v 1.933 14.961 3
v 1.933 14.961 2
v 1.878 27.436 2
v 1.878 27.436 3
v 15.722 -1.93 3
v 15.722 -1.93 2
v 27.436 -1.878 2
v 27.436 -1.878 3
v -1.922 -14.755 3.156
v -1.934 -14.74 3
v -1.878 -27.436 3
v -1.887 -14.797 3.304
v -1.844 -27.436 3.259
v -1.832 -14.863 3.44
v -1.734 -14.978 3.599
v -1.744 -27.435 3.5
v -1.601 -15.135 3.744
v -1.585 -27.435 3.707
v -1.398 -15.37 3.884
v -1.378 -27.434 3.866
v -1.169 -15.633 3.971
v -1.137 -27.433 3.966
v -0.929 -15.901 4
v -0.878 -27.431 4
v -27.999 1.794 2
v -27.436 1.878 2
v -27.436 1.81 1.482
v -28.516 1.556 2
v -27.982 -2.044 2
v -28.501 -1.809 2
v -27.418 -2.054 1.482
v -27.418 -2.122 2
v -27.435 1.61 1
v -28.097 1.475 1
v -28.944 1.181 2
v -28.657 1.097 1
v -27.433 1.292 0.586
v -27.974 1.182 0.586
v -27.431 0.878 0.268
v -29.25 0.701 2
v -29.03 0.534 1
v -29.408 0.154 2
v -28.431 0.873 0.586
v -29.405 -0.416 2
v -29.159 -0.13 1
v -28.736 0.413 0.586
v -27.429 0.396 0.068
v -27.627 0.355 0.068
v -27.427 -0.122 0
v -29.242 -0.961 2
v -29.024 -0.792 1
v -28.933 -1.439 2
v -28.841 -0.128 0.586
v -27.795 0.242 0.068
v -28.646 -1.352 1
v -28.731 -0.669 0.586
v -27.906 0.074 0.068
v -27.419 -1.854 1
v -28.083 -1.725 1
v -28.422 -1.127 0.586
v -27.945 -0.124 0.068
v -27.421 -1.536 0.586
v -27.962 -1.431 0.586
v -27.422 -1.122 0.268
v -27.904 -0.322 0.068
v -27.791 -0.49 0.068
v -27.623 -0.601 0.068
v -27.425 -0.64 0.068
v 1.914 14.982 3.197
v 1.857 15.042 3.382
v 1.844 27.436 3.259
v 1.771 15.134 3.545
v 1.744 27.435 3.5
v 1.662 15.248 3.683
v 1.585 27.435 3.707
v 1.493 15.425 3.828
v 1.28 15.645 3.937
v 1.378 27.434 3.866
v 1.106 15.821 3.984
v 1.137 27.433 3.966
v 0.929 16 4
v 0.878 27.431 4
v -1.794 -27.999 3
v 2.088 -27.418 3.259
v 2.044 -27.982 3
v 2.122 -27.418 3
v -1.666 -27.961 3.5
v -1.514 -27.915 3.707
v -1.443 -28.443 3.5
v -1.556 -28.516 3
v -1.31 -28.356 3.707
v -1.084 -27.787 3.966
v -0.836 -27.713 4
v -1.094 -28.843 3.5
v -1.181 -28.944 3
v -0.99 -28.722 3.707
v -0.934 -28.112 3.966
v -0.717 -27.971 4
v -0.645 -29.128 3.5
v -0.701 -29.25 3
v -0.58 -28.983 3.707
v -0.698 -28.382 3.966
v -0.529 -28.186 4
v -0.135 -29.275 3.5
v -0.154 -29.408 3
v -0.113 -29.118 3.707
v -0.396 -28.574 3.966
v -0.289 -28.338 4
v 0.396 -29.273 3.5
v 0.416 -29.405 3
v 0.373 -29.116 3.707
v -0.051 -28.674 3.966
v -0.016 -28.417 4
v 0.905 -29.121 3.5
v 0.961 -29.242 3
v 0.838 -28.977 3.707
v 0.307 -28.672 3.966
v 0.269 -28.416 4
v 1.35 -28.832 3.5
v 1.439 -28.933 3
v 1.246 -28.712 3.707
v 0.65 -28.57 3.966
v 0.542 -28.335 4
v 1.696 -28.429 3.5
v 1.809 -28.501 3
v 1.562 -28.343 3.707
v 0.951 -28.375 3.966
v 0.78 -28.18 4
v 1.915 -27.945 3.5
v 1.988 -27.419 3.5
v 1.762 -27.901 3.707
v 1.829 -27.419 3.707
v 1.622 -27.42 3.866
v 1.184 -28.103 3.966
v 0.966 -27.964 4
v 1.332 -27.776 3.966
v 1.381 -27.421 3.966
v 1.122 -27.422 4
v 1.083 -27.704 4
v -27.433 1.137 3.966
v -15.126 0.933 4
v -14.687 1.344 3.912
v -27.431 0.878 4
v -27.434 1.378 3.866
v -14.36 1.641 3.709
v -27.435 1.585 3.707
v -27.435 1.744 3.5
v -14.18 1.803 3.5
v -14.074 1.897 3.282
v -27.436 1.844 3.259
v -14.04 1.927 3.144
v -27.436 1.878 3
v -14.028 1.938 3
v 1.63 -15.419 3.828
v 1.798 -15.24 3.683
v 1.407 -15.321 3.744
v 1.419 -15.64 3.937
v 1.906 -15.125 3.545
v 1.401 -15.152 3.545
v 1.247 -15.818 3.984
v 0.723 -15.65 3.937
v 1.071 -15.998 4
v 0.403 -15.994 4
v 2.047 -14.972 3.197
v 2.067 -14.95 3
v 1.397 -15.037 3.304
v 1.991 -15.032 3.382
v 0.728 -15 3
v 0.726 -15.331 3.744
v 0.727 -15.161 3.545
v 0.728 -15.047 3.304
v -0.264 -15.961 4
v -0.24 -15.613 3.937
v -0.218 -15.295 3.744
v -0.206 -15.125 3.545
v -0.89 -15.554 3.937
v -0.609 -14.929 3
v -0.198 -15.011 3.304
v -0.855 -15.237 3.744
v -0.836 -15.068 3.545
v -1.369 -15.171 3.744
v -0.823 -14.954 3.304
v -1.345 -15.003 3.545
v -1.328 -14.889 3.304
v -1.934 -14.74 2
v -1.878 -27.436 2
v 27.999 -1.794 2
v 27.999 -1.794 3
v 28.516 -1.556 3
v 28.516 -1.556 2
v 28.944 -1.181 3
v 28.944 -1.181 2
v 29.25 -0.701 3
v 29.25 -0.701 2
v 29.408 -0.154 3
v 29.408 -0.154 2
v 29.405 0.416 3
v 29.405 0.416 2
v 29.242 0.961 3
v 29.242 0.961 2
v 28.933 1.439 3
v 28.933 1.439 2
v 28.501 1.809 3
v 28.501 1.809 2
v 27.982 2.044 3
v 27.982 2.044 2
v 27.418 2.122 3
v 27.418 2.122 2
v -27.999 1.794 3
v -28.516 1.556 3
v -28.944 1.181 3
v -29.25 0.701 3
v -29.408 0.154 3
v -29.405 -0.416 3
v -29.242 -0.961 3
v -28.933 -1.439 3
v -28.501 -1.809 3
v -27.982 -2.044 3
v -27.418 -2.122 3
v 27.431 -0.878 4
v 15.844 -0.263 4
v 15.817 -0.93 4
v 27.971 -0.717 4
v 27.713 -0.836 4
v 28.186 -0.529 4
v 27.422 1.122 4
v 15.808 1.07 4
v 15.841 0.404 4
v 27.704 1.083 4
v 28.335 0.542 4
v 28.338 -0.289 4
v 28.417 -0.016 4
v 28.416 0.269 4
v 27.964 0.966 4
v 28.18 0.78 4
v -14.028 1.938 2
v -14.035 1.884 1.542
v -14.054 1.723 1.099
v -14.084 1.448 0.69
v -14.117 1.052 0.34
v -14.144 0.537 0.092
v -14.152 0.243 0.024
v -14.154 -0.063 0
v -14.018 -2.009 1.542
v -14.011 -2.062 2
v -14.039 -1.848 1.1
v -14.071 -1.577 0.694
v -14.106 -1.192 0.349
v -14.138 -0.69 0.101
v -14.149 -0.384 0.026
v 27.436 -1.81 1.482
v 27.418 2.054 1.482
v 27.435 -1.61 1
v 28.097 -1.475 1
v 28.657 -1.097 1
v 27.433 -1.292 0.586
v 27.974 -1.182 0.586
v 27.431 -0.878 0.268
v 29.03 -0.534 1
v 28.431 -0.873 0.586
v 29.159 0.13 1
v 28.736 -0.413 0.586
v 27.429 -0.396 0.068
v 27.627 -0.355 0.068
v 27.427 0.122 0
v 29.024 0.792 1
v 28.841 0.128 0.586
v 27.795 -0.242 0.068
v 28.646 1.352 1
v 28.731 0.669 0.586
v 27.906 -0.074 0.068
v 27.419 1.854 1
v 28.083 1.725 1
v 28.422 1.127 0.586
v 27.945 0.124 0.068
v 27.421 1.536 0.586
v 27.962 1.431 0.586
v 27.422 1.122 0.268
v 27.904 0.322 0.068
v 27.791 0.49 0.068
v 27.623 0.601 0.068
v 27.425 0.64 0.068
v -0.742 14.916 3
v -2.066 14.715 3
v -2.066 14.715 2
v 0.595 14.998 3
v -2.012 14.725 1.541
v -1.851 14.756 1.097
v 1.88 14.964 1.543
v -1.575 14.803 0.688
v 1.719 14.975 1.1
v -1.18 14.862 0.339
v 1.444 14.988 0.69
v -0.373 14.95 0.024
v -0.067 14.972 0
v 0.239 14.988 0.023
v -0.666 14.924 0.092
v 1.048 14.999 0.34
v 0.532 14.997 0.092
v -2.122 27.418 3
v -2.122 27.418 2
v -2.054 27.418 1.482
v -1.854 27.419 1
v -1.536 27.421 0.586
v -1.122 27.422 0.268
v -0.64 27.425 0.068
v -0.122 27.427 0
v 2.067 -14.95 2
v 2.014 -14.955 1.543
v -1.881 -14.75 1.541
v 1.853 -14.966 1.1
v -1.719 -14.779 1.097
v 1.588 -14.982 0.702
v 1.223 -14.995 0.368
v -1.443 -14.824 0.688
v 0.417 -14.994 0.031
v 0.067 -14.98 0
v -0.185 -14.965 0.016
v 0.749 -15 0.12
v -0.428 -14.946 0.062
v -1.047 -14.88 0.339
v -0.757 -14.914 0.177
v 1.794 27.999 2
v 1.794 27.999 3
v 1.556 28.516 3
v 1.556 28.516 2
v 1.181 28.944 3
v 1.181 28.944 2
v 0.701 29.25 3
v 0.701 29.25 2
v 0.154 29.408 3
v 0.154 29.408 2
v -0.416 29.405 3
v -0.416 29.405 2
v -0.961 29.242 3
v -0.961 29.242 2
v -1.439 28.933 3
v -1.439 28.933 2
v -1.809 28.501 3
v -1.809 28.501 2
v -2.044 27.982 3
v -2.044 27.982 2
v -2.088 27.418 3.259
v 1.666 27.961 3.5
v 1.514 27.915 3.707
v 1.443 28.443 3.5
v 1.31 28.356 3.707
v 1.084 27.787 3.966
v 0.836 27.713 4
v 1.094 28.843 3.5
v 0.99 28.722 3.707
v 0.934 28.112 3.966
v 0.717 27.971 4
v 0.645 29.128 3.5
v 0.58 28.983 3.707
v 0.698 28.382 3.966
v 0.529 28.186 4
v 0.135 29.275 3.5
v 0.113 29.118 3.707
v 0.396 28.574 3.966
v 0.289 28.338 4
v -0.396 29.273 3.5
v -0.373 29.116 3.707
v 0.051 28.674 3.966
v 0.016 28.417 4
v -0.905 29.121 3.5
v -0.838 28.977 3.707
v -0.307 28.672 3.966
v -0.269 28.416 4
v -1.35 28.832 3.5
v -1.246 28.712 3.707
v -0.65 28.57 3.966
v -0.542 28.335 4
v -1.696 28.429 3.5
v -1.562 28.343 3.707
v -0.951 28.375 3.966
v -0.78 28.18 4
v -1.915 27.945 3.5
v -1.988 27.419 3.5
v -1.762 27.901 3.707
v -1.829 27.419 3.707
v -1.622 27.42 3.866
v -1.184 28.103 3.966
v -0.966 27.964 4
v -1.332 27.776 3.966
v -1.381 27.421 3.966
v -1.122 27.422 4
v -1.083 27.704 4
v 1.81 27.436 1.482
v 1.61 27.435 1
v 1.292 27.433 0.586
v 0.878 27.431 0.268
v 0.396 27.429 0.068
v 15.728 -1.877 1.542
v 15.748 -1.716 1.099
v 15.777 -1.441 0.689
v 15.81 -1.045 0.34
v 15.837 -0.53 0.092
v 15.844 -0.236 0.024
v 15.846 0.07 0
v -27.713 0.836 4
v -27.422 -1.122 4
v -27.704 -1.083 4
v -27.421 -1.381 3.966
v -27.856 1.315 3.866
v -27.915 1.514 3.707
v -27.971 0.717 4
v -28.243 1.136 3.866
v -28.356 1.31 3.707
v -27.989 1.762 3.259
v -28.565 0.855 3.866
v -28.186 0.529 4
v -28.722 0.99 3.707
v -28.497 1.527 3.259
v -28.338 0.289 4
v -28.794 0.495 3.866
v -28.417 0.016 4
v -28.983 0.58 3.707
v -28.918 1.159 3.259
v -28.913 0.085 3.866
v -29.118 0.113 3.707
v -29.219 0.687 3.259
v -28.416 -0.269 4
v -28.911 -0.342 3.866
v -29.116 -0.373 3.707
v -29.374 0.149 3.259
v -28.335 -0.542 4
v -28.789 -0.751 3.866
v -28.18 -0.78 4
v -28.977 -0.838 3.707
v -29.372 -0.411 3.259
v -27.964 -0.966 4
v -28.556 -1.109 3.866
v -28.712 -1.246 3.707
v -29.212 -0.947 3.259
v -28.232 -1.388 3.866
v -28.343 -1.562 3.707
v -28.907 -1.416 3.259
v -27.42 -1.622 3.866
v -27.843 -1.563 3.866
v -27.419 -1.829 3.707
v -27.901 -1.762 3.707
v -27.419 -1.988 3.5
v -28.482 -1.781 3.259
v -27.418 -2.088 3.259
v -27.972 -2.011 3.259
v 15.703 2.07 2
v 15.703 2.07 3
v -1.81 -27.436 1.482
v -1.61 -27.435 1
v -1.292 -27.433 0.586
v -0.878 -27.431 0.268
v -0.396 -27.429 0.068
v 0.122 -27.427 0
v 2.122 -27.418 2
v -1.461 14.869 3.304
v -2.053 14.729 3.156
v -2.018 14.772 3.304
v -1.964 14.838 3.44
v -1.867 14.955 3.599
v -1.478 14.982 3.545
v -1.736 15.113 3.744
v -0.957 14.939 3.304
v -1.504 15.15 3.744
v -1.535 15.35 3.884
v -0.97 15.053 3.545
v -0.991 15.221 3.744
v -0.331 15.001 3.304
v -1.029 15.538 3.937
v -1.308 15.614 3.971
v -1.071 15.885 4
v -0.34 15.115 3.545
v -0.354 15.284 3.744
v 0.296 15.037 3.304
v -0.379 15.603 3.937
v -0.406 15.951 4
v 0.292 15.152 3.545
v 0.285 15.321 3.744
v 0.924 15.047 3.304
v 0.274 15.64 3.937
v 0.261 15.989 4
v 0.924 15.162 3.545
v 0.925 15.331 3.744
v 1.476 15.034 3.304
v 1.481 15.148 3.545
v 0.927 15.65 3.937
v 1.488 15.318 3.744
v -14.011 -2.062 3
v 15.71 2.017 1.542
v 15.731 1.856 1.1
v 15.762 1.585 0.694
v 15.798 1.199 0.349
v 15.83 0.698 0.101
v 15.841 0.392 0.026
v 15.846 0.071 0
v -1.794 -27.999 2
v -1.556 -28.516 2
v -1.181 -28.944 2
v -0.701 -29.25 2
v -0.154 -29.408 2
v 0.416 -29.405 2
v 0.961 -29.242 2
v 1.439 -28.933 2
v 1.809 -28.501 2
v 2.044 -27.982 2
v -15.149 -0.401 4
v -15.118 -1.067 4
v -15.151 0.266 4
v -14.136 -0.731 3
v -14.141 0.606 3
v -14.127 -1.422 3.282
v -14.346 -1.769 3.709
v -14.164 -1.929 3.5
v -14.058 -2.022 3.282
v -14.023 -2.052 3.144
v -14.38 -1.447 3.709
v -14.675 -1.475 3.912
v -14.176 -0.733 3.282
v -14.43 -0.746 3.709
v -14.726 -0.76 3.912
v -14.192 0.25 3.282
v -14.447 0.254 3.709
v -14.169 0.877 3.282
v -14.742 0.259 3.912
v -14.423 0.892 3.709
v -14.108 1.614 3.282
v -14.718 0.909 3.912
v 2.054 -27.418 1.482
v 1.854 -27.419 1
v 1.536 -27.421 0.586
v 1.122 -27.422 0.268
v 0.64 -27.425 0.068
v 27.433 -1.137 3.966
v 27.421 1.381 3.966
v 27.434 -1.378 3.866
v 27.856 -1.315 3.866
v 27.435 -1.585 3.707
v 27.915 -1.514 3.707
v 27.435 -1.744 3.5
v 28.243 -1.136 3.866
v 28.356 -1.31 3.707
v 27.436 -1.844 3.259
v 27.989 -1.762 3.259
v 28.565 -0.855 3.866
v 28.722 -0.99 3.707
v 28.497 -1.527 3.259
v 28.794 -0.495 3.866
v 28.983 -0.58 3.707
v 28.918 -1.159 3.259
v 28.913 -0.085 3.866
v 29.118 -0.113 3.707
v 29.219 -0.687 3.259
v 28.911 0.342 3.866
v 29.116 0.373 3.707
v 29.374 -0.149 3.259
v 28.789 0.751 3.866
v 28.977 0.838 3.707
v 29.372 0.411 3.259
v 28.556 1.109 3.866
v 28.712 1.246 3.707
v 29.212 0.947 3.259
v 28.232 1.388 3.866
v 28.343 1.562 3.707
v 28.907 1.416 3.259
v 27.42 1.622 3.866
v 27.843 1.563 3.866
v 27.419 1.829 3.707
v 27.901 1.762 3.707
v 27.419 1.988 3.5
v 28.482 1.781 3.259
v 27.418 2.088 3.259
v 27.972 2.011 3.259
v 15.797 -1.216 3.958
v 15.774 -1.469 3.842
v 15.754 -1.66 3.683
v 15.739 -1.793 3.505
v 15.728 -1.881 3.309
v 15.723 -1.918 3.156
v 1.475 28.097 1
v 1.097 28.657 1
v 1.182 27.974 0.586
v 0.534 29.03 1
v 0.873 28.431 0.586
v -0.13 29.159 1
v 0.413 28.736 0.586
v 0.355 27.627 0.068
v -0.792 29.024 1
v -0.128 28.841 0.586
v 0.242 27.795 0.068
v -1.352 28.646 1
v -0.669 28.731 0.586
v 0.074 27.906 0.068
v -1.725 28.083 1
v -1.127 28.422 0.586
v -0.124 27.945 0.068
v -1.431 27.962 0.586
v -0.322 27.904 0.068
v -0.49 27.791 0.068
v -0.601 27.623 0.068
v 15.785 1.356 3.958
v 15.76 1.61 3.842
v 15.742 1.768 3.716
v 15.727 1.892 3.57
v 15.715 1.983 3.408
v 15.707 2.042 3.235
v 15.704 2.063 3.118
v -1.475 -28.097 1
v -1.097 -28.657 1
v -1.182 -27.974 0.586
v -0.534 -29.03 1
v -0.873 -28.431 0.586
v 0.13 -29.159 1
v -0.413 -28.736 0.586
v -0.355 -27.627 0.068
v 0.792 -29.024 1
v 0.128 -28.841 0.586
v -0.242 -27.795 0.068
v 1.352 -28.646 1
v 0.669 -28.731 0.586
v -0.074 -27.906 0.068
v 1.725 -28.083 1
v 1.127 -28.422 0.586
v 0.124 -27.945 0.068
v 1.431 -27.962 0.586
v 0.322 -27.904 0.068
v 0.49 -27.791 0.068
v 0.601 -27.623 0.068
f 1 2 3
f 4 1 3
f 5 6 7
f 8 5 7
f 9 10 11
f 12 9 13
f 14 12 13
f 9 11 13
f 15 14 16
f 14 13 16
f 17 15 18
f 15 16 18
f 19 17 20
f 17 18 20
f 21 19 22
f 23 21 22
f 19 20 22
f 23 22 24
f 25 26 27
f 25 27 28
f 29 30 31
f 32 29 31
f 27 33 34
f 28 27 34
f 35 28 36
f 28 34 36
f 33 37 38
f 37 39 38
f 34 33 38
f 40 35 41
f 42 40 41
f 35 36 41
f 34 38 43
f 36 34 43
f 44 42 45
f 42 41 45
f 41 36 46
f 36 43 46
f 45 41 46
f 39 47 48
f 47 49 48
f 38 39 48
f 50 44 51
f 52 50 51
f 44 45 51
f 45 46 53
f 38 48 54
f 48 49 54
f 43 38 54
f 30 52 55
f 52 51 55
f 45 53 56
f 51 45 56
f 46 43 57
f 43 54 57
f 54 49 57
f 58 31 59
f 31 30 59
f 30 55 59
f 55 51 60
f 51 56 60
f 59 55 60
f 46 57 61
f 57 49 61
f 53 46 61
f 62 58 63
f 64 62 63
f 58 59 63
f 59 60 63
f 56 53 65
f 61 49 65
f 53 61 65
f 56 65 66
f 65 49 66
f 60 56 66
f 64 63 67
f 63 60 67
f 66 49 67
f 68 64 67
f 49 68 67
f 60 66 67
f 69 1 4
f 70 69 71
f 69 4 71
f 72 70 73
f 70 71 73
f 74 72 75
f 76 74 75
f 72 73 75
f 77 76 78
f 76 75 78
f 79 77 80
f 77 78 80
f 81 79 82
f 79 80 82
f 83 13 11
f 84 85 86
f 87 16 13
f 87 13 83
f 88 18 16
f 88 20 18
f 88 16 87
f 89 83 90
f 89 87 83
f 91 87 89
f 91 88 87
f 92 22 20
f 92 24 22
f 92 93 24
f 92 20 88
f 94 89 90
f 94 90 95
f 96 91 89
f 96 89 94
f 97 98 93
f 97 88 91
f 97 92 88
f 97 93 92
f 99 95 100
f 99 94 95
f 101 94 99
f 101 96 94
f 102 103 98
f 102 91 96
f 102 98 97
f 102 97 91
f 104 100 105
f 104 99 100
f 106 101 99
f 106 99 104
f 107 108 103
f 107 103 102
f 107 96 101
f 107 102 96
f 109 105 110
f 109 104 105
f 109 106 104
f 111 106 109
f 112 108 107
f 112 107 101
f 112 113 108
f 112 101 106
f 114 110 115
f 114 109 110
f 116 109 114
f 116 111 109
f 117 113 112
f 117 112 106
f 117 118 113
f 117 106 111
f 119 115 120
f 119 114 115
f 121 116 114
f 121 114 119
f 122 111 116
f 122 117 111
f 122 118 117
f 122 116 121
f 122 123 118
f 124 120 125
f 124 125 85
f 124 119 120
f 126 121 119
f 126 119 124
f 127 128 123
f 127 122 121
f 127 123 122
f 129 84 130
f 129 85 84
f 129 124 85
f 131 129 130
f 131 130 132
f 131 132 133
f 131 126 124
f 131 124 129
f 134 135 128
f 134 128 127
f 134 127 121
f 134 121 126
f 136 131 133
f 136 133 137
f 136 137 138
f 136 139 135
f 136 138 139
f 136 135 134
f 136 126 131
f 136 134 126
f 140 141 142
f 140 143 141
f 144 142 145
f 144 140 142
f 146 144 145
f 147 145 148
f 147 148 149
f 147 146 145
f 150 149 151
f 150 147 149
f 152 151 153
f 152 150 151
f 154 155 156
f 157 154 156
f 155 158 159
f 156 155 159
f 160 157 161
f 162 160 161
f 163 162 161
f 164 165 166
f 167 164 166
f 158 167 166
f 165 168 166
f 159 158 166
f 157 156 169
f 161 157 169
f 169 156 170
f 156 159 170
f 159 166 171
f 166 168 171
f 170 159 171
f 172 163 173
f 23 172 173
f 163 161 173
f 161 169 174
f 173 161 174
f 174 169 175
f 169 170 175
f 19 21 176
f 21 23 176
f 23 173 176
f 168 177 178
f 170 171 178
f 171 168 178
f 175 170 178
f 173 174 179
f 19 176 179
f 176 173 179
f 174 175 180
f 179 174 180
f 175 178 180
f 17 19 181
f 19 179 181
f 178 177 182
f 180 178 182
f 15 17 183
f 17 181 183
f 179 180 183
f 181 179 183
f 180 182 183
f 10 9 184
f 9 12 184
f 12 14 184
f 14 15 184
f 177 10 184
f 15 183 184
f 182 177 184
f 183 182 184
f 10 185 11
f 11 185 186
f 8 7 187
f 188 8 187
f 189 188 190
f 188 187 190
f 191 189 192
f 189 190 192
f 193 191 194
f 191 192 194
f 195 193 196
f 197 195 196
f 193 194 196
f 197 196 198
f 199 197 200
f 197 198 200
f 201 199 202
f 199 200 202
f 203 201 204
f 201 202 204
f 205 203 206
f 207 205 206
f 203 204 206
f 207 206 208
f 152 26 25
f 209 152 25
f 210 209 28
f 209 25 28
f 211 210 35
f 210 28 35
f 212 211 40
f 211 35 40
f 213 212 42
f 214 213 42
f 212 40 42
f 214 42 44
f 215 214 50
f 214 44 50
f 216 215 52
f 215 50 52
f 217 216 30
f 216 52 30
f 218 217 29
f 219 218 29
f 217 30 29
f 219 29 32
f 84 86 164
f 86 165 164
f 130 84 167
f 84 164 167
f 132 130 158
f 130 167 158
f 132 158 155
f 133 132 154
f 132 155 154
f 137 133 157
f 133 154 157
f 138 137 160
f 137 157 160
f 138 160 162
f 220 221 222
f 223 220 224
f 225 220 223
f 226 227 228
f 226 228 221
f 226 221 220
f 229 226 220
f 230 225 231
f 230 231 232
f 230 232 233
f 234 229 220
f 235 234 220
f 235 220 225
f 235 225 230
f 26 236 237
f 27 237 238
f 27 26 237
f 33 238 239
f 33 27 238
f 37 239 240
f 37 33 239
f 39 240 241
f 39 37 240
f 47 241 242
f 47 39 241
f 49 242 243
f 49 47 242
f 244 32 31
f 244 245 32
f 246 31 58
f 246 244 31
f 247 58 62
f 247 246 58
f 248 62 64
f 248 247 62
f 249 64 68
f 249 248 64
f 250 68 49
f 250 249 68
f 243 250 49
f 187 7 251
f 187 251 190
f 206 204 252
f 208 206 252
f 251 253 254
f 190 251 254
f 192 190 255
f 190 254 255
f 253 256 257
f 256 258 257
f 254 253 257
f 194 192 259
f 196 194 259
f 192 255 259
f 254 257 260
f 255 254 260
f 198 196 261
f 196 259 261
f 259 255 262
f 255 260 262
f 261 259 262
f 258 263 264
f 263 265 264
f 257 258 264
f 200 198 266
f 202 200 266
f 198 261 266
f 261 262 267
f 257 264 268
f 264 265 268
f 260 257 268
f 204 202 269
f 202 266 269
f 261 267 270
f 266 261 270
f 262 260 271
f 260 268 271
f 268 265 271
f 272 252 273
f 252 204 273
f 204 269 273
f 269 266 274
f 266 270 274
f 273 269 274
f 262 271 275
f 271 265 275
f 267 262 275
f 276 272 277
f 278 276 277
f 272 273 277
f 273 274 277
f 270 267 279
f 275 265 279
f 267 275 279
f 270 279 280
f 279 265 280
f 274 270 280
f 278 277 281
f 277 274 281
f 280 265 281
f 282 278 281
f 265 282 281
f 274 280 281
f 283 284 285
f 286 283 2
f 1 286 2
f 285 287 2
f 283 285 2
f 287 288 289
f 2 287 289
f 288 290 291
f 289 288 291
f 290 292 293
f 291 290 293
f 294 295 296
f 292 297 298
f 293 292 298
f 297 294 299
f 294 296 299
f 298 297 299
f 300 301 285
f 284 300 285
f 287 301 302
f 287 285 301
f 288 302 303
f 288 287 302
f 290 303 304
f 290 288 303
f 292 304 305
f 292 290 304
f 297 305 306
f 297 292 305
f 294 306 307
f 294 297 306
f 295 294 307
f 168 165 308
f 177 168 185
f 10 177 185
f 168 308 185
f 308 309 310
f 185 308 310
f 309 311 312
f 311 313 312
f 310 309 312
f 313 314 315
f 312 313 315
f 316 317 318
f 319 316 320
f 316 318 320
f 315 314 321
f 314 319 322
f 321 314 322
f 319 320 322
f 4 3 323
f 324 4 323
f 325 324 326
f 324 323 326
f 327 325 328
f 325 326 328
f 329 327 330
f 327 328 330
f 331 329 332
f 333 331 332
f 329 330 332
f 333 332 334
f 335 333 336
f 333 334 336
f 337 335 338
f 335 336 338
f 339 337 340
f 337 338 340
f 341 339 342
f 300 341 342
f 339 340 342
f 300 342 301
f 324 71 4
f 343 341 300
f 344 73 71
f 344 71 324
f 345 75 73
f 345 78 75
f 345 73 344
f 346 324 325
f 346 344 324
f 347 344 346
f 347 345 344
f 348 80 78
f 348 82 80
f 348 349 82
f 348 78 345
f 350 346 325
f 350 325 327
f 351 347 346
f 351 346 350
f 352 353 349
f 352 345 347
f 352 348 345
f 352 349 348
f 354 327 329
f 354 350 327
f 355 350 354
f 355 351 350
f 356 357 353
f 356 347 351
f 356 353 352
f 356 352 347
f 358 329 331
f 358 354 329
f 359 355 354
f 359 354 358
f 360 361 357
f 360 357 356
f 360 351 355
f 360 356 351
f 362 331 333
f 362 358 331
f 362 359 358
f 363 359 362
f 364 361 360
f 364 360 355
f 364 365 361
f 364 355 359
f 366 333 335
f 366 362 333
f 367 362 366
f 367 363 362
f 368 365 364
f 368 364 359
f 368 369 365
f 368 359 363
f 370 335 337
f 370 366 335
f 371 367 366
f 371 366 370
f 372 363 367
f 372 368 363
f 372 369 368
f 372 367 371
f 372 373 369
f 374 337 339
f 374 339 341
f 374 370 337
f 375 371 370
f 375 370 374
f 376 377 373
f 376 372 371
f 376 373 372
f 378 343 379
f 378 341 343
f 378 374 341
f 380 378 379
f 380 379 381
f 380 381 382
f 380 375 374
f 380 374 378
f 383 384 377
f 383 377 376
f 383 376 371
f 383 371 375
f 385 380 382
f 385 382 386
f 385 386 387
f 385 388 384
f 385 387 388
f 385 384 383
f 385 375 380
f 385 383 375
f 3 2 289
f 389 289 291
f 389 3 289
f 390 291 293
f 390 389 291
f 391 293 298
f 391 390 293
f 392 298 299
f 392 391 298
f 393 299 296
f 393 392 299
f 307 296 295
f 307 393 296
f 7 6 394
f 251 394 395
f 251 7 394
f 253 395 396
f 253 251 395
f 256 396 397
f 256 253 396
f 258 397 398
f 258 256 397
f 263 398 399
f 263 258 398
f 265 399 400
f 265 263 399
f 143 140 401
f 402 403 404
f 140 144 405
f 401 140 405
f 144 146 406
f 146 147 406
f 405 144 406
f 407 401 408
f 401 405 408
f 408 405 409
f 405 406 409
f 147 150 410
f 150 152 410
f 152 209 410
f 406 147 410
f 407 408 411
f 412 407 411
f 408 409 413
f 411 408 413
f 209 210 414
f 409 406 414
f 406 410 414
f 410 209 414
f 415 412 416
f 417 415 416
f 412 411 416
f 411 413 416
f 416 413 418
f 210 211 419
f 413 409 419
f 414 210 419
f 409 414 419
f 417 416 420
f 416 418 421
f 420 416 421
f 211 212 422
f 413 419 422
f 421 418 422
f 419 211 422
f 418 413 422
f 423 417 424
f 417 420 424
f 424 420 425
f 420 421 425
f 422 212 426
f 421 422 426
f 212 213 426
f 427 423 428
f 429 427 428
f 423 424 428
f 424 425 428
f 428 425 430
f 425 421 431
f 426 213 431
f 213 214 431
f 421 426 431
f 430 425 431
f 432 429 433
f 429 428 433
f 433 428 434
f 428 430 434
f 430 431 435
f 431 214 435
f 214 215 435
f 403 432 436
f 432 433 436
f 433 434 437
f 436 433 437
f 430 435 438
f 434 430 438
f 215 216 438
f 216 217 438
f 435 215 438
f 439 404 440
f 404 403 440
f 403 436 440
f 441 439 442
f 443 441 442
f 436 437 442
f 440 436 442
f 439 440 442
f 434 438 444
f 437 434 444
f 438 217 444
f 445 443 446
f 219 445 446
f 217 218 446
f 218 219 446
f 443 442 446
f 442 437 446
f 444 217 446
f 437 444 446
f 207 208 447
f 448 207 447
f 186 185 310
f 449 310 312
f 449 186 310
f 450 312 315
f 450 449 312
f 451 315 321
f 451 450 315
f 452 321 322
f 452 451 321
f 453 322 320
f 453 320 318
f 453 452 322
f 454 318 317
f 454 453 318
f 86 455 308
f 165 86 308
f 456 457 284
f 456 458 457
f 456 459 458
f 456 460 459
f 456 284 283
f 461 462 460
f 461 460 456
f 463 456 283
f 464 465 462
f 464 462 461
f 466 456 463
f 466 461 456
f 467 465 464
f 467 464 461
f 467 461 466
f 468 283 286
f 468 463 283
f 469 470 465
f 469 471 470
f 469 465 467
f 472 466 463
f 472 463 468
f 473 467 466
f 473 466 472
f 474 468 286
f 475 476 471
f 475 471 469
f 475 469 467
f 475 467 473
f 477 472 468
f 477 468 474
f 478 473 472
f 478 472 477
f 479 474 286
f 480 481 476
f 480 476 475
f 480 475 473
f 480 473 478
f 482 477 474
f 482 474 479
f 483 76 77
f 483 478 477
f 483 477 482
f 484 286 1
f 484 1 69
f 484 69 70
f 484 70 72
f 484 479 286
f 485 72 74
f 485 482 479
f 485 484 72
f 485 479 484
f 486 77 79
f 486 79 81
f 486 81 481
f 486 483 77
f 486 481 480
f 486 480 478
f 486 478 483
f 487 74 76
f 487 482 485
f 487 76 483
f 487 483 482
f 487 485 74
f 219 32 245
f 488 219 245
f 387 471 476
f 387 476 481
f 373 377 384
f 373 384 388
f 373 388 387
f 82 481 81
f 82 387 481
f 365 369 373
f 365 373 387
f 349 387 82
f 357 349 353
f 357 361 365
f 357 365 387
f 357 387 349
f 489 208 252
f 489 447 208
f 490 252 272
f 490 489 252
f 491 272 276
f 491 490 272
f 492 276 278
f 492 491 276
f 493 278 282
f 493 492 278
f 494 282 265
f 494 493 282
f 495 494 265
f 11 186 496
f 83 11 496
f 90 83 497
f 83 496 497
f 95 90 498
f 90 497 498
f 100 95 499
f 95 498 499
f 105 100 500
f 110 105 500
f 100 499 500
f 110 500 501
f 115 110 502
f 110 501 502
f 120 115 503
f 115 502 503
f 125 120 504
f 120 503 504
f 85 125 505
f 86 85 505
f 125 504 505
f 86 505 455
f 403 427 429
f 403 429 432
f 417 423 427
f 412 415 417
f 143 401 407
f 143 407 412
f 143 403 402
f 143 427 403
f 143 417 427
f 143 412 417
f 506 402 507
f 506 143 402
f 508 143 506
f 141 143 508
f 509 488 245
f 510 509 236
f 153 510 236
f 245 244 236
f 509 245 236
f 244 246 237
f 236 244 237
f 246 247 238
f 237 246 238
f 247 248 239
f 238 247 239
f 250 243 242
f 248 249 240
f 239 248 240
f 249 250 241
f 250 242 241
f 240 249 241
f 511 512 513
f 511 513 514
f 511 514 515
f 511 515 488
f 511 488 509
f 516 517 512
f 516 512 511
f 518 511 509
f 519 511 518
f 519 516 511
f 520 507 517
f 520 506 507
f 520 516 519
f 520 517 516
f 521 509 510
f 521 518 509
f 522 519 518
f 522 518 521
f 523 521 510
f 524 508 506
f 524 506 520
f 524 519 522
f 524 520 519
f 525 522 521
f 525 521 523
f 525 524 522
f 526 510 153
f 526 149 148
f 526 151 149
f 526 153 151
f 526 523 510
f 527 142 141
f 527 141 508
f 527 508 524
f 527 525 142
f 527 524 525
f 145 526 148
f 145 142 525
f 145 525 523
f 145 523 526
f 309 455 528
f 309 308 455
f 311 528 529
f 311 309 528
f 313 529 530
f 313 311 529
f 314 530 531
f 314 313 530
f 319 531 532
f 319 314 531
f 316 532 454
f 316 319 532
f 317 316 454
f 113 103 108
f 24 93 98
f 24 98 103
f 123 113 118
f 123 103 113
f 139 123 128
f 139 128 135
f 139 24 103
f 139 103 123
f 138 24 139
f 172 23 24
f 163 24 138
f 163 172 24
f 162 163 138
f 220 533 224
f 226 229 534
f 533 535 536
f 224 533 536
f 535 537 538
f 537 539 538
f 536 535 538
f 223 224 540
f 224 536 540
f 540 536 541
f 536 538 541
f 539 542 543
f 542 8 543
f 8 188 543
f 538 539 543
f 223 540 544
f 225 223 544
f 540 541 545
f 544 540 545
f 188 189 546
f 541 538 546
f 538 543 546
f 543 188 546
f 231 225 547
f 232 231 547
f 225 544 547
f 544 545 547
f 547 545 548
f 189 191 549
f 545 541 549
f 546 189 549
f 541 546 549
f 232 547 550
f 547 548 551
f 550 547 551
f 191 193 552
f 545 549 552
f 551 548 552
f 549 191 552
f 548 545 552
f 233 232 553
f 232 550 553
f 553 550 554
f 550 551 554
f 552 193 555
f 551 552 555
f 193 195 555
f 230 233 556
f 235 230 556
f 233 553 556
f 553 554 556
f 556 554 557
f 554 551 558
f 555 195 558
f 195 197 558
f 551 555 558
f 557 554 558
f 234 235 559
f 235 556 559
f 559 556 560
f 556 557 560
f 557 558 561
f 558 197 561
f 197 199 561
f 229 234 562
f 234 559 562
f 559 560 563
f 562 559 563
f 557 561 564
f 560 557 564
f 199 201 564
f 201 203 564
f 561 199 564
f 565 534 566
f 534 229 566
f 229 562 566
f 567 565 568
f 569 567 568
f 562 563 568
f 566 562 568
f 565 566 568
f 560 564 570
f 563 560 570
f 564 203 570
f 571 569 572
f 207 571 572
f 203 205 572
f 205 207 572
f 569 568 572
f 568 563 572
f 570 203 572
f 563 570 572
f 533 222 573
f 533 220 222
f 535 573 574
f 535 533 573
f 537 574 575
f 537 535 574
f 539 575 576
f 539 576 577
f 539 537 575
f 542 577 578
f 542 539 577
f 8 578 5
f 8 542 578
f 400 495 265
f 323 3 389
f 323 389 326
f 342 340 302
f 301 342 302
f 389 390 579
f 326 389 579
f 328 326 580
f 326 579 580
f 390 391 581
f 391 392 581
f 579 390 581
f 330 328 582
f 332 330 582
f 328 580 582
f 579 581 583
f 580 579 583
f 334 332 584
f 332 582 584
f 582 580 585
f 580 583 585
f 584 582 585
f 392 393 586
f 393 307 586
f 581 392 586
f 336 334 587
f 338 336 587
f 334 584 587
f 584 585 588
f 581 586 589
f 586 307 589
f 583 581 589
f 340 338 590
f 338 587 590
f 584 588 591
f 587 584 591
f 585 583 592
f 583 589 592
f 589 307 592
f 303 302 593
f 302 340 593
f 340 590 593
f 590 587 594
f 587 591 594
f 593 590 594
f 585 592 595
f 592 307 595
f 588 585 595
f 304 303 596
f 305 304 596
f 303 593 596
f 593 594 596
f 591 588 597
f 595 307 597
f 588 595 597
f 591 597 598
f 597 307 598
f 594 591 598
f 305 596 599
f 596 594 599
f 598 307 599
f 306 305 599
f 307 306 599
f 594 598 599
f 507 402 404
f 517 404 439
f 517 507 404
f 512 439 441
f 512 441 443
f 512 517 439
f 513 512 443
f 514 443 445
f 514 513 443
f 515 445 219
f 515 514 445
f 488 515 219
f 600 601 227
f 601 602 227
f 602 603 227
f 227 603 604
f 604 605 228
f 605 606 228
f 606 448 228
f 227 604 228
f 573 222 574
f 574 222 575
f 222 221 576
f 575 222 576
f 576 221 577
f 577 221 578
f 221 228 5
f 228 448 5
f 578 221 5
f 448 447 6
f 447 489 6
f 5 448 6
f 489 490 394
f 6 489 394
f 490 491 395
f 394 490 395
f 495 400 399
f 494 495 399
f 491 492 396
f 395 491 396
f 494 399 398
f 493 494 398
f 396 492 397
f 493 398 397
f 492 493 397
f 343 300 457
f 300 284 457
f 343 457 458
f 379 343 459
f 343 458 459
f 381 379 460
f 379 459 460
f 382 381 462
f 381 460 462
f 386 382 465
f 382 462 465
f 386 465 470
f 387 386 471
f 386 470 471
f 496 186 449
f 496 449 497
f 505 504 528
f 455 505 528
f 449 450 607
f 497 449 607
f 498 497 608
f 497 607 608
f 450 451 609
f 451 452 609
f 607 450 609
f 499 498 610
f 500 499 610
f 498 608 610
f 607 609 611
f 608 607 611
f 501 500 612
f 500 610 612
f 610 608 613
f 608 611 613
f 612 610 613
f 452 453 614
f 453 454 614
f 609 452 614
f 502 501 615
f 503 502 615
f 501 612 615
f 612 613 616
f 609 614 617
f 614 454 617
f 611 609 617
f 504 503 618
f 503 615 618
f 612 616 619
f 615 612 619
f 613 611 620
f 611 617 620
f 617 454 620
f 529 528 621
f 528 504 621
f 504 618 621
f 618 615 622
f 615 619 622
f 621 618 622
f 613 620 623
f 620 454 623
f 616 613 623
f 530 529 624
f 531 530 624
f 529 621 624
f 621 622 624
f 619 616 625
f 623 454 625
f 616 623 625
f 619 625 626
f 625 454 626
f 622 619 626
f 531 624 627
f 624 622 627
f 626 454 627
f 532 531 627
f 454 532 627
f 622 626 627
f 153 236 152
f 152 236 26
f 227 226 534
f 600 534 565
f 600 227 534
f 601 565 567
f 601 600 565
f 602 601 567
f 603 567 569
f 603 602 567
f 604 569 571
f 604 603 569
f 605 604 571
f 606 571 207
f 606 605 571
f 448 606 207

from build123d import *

# Parameters (mm, degrees)
F1_DEPTH = 4
F2_R     = 1.9999
F2_2_R   = 1.9999
F2_3_R   = 1.9999
F2_4_R   = 1.9999
F3_R     = 1
F3_2_R   = 1
F3_3_R   = 1
F3_4_R   = 1


# Not quite as in the source:
# - a fillet or chamfer is up to 0.001 mm smaller than in the source, because OpenCascade refuses the exact size


with BuildPart() as f1:
    # F0 (on Top) → F1 (new body)
    with BuildSketch(Plane.XY):
        with BuildLine():
            ThreePointArc((-2.065538543, 14.7146584401), (-0.0743129661, 14.9717221589), (1.9334062251, 14.960555095))
            Line((1.9334062251, 14.960555095), (1.8778587128, 27.4358095681))
            ThreePointArc((1.8778587128, 27.4358095681), (-0.1310266046, 29.4268845997), (-2.1221016363, 27.4179992823))
            Line((-2.1221016363, 27.4179992823), (-2.065538543, 14.7146584401))
        make_face()
    extrude(amount=F1_DEPTH)

    # F2#3 (radius 2 in the source; OpenCascade refuses exactly that, so slightly less here)
    f2_3_edges = [f1.edges().sort_by_distance(p)[0] for p in [
        (1.905632, 21.198182, 0),
    ]]
    fillet(f2_3_edges, radius=F2_3_R)

    # F3#3
    f3_3_edges = [f1.edges().sort_by_distance(p)[0] for p in [
        (-2.09382, 21.066329, 4),
        (-0.074313, 14.971722, 4),
        (1.905632, 21.198182, 4),
        (-0.131027, 29.426885, 4),
    ]]
    fillet(f3_3_edges, radius=F3_3_R)


with BuildPart() as f1b:
    # F0 (on Top) → F1, piece 2 (new body)
    with BuildSketch(Plane.XY):
        with BuildLine():
            ThreePointArc((15.7027960238, 2.0699383398), (15.8461378969, 0.0705907094), (15.7216202135, -1.9300174947))
            Line((15.7216202135, -1.9300174947), (27.4358095681, -1.8778587128))
            ThreePointArc((27.4358095681, -1.8778587128), (29.4268845997, 0.1310266046), (27.4179992823, 2.1221016363))
            Line((27.4179992823, 2.1221016363), (15.7027960238, 2.0699383398))
        make_face()
    extrude(amount=F1_DEPTH)

    # F2#2 (radius 2 in the source; OpenCascade refuses exactly that, so slightly less here)
    f2_2_edges = [f1b.edges().sort_by_distance(p)[0] for p in [
        (21.578715, -1.903938, 0),
    ]]
    fillet(f2_2_edges, radius=F2_2_R)

    # F3#2
    f3_2_edges = [f1b.edges().sort_by_distance(p)[0] for p in [
        (21.578715, -1.903938, 4),
    ]]
    fillet(f3_2_edges, radius=F3_2_R)


with BuildPart() as f1c:
    # F0 (on Top) → F1, piece 3 (new body)
    with BuildSketch(Plane.XY):
        with BuildLine():
            Line((-14.0280318673, 1.9375583925), (-27.4358095681, 1.8778587127))
            ThreePointArc((-27.4358095681, 1.8778587128), (-29.4268845997, -0.1310266046), (-27.4179992823, -2.1221016363))
            Line((-27.4179992823, -2.1221016363), (-14.0112354856, -2.062406471))
            ThreePointArc((-14.0112354856, -2.062406471), (-14.153563757, -0.0629864294), (-14.0280318673, 1.9375583925))
        make_face()
    extrude(amount=F1_DEPTH)

    # F2#4 (radius 2 in the source; OpenCascade refuses exactly that, so slightly less here)
    f2_4_edges = [f1c.edges().sort_by_distance(p)[0] for p in [
        (-20.714617, -2.092254, 0),
    ]]
    fillet(f2_4_edges, radius=F2_4_R)

    # F3#4
    f3_4_edges = [f1c.edges().sort_by_distance(p)[0] for p in [
        (-20.714617, -2.092254, 4),
        (-14.153564, -0.062986, 4),
        (-20.731921, 1.907709, 4),
        (-29.426885, -0.131027, 4),
    ]]
    fillet(f3_4_edges, radius=F3_4_R)


with BuildPart() as f1d:
    # F0 (on Top) → F1, piece 4 (new body)
    with BuildSketch(Plane.XY):
        with BuildLine():
            ThreePointArc((-1.8778587128, -27.4358095681), (0.1310266046, -29.4268845997), (2.1221016363, -27.4179992823))
            Line((2.1221016363, -27.4179992823), (2.0665876805, -14.9502811926))
            ThreePointArc((2.0665876805, -14.9502811926), (0.0590475403, -14.9793266627), (-1.9343882494, -14.7400051091))
            Line((-1.9343882494, -14.7400051091), (-1.8778587128, -27.4358095681))
        make_face()
    extrude(amount=F1_DEPTH)

    # F2 (radius 2 in the source; OpenCascade refuses exactly that, so slightly less here)
    f2_edges = [f1d.edges().sort_by_distance(p)[0] for p in [
        (2.094345, -21.18414, 0),
    ]]
    fillet(f2_edges, radius=F2_R)

    # F3
    f3_edges = [f1d.edges().sort_by_distance(p)[0] for p in [
        (-1.906123, -21.087907, 4),
        (0.131027, -29.426885, 4),
        (2.094345, -21.18414, 4),
        (0.059048, -14.979327, 4),
    ]]
    fillet(f3_edges, radius=F3_R)


solid = Compound([f1.part, f1b.part, f1c.part, f1d.part])
